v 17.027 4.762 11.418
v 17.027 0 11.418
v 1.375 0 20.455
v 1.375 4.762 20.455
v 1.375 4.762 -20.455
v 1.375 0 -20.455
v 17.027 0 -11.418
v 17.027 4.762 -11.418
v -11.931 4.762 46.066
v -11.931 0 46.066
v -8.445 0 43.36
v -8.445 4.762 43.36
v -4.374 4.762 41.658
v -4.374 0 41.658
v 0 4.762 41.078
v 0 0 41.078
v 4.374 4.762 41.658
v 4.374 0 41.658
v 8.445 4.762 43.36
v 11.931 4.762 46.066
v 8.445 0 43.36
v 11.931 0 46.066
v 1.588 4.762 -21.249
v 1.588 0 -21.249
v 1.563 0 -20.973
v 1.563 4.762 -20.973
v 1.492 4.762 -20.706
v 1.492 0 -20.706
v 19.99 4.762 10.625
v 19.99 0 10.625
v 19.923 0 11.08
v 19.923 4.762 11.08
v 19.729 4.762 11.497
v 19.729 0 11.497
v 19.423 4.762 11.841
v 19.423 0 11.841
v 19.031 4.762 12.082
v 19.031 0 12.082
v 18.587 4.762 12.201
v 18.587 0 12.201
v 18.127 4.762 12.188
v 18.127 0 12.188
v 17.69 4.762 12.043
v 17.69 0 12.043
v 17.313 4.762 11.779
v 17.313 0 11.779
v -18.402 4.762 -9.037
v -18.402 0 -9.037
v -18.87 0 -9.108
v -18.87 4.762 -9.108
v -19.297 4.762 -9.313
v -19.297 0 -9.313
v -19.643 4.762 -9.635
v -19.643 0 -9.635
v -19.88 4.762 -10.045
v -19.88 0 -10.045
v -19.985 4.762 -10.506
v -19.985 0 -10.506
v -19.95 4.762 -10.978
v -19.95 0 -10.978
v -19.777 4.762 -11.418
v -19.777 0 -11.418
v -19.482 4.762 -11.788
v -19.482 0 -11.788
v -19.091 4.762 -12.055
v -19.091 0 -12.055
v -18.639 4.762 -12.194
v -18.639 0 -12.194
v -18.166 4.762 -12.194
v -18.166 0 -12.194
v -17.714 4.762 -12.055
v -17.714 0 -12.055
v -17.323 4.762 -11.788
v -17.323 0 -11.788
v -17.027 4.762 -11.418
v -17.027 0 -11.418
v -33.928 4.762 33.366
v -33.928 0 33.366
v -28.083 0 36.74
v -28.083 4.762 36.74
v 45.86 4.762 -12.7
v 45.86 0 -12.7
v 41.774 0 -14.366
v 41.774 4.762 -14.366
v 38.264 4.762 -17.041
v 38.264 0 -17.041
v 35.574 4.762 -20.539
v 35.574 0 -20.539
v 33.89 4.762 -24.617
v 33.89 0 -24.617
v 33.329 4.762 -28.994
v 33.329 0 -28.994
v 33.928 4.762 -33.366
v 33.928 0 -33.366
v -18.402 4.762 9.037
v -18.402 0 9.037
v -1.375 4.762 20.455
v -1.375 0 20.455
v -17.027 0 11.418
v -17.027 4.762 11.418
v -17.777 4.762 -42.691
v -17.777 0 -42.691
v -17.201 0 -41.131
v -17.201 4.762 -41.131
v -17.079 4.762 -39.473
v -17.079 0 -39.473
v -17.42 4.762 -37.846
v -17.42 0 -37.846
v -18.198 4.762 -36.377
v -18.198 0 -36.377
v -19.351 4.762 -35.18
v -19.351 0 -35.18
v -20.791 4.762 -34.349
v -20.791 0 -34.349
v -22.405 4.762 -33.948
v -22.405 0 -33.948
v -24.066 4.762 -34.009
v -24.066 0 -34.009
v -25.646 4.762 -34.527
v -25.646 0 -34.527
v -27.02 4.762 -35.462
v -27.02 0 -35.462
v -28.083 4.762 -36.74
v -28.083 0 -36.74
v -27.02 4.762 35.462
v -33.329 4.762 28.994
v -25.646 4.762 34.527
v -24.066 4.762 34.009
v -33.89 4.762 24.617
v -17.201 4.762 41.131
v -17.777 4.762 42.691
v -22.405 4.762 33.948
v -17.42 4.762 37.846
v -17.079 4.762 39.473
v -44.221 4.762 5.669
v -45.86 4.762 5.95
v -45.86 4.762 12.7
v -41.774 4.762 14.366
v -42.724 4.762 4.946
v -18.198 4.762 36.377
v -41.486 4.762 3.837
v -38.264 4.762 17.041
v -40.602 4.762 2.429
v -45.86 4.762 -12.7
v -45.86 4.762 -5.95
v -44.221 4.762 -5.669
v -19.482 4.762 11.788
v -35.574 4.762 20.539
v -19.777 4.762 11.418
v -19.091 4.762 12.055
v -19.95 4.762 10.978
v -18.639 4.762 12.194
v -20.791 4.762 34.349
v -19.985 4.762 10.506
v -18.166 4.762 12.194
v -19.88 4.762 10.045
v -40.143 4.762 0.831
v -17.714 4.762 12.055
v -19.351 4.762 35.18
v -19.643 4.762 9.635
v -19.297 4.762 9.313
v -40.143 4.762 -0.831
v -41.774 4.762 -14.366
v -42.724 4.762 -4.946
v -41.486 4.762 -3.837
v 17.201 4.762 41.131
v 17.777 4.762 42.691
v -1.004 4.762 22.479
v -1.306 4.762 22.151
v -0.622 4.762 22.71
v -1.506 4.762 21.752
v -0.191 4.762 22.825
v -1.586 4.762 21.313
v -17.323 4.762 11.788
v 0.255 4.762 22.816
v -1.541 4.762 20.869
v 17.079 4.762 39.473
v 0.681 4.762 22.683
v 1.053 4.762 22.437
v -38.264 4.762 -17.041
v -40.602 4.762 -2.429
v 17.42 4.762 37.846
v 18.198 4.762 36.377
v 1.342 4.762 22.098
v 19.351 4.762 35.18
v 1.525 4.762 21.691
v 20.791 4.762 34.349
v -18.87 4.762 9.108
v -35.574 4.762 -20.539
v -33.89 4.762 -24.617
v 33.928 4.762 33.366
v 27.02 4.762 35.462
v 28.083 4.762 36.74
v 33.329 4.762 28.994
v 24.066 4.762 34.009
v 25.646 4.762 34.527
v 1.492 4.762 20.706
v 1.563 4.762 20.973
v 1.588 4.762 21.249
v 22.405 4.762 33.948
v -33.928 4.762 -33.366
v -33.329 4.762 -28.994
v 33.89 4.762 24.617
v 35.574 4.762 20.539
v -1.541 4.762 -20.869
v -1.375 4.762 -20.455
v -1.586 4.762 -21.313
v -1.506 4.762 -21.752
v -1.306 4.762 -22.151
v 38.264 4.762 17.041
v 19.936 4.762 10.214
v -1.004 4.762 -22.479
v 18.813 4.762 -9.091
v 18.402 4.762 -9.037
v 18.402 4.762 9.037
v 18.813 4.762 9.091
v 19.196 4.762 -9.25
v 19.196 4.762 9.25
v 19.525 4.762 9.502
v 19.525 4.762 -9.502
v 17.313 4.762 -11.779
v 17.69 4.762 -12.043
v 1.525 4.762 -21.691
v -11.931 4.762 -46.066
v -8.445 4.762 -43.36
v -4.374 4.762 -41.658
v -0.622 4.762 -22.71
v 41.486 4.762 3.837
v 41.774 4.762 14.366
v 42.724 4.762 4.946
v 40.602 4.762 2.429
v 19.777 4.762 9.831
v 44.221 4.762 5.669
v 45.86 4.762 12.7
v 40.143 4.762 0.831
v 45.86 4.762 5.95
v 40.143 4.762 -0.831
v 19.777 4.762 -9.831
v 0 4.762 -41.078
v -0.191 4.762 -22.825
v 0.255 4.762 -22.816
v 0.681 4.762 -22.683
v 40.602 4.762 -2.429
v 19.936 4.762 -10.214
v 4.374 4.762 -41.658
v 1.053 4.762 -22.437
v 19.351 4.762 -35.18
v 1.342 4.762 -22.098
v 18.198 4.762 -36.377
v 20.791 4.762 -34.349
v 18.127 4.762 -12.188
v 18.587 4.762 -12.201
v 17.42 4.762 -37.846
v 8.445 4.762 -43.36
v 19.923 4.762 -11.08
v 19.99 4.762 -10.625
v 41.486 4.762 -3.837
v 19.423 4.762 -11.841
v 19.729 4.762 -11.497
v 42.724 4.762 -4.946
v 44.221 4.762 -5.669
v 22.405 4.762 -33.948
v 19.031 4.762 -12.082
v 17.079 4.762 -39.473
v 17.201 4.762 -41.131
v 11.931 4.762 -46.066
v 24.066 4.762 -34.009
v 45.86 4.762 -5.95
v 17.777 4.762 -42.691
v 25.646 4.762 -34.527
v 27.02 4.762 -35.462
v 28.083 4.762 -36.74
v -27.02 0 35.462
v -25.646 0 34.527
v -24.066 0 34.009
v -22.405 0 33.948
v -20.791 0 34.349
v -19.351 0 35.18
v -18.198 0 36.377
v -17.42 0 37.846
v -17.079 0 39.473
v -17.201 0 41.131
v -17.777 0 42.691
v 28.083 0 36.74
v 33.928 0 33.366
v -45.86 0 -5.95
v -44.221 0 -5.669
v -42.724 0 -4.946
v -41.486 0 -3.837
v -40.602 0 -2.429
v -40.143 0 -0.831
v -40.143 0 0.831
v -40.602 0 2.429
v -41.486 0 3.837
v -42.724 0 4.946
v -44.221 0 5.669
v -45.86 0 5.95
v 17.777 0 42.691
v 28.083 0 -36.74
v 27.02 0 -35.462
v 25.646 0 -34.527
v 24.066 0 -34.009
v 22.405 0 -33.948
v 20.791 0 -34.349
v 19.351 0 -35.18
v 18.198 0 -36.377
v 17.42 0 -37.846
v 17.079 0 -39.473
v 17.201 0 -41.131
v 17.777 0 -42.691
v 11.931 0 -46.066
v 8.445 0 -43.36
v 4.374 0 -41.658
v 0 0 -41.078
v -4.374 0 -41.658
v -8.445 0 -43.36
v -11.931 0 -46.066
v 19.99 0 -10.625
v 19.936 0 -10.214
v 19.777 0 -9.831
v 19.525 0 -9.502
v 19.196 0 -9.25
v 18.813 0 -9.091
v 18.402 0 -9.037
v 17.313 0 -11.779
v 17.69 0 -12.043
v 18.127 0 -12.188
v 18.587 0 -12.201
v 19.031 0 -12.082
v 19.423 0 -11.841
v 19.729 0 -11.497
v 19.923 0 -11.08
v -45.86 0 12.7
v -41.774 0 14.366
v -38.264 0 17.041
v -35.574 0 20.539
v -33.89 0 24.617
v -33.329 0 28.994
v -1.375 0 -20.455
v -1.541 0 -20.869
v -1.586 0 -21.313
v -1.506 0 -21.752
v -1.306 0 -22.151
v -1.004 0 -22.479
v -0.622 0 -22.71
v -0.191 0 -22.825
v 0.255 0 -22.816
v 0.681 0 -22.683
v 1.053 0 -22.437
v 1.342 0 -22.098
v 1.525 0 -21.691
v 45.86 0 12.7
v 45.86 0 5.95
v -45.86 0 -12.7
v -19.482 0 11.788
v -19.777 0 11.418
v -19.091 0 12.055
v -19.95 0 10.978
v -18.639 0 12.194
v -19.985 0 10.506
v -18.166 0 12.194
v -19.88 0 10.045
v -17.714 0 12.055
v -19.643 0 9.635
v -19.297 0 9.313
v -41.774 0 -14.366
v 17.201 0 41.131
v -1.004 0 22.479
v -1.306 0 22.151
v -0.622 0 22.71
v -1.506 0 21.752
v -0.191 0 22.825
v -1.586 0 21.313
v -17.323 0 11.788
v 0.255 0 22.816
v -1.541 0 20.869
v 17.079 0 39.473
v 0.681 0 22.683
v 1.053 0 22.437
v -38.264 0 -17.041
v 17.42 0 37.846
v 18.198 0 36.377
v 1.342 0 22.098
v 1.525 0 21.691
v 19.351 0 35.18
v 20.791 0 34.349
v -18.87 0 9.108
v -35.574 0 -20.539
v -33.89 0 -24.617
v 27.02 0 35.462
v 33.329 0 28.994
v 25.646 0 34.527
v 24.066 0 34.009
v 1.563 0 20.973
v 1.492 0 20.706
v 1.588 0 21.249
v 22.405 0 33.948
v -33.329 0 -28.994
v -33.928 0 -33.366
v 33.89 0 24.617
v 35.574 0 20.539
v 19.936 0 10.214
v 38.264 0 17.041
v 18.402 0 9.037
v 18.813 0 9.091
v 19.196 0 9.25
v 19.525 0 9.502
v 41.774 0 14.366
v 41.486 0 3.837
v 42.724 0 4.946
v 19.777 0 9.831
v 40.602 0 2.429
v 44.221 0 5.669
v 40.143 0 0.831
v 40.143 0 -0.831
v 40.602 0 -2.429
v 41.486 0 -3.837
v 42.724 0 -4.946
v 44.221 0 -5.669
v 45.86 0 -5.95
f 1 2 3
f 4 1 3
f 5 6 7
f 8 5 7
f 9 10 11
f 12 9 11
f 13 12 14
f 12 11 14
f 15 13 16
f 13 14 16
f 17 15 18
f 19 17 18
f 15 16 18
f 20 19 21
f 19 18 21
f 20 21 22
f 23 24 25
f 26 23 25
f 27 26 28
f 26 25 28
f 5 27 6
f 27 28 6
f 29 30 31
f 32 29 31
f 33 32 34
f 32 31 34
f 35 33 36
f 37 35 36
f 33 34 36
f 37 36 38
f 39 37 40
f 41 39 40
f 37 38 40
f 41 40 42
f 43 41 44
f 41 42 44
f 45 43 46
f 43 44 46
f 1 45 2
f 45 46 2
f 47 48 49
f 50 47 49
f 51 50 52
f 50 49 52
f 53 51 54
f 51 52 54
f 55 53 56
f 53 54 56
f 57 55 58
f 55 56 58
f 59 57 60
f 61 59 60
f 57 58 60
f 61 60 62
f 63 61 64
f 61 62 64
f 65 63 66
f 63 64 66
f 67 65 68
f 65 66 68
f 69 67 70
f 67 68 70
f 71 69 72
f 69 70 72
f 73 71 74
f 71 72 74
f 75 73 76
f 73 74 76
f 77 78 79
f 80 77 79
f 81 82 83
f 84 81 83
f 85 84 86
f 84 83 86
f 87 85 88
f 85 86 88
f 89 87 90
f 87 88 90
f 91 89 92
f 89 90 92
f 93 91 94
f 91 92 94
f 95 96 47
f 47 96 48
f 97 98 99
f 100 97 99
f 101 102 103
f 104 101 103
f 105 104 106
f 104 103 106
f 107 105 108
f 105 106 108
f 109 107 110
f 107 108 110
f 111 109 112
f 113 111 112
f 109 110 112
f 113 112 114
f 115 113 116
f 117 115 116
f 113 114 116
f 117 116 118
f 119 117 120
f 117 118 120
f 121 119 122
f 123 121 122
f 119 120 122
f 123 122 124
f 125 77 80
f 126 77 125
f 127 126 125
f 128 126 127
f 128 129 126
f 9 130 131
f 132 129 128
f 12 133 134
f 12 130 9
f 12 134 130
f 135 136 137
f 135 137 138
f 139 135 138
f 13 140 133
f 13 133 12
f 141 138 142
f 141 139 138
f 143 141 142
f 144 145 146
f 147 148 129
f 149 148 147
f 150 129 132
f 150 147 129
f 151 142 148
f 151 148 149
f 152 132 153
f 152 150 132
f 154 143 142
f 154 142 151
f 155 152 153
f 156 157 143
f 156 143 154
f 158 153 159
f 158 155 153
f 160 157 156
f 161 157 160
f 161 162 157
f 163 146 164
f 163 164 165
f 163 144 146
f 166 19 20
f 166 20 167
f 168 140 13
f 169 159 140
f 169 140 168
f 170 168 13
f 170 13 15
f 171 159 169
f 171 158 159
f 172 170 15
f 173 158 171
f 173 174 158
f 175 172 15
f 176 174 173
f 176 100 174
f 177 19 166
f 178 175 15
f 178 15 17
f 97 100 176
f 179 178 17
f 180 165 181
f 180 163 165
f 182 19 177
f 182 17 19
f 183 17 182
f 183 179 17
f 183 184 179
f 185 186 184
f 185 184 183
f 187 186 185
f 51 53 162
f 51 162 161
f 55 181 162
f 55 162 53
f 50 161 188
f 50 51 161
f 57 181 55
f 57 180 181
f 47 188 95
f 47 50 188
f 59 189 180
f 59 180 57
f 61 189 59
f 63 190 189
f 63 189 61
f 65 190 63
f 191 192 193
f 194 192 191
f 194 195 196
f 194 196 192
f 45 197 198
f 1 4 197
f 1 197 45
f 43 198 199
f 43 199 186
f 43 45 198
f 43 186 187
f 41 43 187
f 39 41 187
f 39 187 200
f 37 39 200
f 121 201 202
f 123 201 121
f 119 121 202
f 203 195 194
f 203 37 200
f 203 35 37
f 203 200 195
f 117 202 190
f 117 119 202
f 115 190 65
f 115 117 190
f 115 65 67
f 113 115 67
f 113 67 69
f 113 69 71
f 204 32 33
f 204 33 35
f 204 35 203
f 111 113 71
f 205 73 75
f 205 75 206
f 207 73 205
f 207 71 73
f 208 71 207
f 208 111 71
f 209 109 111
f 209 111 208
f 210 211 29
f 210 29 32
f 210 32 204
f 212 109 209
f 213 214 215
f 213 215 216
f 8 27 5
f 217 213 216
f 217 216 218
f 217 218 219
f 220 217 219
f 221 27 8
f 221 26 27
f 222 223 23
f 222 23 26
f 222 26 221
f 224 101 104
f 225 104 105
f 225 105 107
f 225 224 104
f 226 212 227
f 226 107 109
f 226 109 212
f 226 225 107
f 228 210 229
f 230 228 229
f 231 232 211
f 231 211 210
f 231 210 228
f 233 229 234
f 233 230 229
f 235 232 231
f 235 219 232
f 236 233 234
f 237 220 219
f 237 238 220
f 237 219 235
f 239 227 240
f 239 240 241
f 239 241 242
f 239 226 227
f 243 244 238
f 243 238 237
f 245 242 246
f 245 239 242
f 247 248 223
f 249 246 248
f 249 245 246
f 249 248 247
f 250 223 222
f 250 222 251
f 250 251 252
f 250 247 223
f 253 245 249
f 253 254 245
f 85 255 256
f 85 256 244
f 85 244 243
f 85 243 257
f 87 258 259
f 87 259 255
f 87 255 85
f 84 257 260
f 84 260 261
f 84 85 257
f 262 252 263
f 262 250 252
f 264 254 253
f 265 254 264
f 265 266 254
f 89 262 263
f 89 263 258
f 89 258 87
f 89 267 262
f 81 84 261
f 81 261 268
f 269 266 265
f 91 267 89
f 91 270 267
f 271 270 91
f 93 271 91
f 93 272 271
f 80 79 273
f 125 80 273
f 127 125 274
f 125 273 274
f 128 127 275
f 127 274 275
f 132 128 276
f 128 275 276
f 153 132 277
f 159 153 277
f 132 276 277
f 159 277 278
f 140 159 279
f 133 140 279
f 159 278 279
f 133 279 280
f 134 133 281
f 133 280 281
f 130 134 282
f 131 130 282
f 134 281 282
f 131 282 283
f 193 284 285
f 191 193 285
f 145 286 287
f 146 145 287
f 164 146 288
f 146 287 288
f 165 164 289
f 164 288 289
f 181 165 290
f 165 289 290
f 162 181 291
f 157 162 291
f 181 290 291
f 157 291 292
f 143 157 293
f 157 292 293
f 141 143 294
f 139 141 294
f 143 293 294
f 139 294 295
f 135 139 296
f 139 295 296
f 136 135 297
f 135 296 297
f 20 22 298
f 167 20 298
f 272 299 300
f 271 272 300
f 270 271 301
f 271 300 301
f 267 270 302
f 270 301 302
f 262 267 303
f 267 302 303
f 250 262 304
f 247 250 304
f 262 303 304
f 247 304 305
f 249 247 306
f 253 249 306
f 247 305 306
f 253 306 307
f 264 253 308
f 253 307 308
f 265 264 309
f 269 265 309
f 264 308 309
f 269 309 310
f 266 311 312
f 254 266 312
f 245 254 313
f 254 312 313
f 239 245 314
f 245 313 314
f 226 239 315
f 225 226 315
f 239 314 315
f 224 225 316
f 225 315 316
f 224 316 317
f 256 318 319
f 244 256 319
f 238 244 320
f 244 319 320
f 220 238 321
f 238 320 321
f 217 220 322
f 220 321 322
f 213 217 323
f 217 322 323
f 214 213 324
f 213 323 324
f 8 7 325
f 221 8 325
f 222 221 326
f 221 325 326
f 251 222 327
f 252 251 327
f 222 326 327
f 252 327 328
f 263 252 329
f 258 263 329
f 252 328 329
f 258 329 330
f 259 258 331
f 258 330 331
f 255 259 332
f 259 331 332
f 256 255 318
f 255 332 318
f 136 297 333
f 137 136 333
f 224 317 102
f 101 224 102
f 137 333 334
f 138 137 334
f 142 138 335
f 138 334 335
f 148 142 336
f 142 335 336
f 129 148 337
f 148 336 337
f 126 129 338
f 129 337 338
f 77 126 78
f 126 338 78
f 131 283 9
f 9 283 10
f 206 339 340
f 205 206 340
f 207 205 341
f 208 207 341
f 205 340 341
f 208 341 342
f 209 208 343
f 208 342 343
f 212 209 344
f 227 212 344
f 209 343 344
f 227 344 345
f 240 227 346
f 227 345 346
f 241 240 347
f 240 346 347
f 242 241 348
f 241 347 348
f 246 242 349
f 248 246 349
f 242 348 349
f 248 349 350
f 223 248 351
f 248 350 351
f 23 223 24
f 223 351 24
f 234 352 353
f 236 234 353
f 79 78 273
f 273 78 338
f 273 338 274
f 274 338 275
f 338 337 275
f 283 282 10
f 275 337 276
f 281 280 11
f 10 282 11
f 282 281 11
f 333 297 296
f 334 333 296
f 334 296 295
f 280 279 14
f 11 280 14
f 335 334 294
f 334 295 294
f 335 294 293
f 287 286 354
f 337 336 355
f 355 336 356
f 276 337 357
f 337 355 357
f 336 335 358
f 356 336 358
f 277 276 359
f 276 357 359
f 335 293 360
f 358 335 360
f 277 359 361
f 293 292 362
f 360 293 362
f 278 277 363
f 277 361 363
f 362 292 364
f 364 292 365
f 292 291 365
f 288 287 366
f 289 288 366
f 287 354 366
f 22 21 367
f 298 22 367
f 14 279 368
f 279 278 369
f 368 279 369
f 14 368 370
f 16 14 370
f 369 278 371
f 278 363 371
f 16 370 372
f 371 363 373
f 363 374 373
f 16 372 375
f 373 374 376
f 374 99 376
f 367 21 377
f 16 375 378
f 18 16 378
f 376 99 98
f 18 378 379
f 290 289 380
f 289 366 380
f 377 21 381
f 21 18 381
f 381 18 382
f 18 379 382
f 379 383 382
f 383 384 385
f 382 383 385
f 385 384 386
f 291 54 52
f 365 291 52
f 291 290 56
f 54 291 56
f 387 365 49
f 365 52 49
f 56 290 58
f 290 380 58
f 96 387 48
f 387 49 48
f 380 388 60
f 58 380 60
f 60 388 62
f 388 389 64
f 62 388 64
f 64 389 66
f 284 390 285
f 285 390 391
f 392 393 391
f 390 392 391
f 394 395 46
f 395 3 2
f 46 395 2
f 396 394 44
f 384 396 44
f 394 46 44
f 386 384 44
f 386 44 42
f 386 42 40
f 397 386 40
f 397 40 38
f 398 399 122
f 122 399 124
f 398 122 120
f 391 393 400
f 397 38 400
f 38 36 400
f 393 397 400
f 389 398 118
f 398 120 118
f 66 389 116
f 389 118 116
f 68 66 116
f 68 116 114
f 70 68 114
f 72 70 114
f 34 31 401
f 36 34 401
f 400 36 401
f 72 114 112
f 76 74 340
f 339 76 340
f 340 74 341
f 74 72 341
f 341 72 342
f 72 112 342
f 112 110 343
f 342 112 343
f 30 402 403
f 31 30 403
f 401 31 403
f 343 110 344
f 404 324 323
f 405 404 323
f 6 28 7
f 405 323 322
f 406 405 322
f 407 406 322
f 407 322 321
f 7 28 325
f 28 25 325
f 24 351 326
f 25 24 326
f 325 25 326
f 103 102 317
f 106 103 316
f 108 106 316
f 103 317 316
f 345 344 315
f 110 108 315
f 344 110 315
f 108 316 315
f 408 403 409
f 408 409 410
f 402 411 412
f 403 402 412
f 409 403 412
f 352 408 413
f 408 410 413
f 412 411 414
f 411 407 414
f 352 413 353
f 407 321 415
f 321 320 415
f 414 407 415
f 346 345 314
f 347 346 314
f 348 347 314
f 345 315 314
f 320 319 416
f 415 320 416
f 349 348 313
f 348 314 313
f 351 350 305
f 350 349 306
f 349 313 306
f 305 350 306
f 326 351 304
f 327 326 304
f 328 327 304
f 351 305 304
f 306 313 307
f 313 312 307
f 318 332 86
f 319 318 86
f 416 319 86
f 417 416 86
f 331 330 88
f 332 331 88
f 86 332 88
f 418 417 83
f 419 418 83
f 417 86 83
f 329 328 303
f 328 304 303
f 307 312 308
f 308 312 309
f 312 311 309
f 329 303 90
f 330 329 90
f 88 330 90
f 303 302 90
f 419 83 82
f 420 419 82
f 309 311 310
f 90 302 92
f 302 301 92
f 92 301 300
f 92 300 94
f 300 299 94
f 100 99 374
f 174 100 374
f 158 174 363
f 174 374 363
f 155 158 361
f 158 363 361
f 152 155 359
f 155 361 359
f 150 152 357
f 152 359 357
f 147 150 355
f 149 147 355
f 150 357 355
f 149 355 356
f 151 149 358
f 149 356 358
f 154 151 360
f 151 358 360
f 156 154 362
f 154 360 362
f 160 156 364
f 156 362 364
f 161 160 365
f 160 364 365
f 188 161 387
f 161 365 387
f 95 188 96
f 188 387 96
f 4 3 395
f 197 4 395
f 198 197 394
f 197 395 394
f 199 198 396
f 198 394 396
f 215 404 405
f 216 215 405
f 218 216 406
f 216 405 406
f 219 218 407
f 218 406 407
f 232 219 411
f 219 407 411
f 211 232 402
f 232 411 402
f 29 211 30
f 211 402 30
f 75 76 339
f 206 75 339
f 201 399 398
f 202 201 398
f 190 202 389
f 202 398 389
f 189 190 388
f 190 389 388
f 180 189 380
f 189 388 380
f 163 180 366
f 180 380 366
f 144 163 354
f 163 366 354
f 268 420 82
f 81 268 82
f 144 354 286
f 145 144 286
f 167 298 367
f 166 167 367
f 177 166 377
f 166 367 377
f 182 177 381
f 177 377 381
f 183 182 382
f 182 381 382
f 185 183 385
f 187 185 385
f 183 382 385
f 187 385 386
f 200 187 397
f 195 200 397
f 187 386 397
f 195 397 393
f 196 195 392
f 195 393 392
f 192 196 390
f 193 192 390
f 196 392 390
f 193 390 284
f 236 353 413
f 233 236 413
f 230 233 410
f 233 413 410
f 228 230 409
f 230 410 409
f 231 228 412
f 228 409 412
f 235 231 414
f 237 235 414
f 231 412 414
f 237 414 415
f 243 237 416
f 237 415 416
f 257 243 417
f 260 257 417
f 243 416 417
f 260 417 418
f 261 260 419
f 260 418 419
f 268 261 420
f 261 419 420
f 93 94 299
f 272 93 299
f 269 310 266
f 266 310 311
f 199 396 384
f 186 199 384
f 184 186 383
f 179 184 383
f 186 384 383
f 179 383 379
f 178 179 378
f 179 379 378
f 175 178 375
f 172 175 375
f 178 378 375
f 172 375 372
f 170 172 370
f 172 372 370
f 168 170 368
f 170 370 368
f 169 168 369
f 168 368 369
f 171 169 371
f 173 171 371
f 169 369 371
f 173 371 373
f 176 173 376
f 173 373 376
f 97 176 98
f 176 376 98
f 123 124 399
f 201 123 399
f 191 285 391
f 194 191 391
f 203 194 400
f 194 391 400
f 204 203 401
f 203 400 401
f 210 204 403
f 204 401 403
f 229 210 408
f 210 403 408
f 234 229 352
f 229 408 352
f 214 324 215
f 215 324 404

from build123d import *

# Parameters (mm, degrees)
BOSS_EXTRUDE1_DEPTH = 4.7625


with BuildPart() as part:
    # Sketch1 → Boss-Extrude1 (new body)
    with BuildSketch(Plane(origin=(0, 0, 0), x_dir=(1, 0, 0), z_dir=(0, 1, 0))):
        with BuildLine():
            ThreePointArc((-33.928372628, 33.36566521), (-35.574336427, 20.538852712), (-45.8597, 12.7))
            Line((-45.8597, 12.7), (-45.8597, 5.950469261))
            ThreePointArc((-45.8597, 5.950469261), (-40.084375, 0), (-45.8597, -5.950469261))
            Line((-45.8597, -5.950469261), (-45.8597, -12.7))
            ThreePointArc((-45.8597, -12.7), (-35.574336427, -20.538852712), (-33.928372628, -33.36566521))
            Line((-33.928372628, -33.36566521), (-28.083107544, -36.740430579))
            ThreePointArc((-28.083107544, -36.740430579), (-20.0421875, -34.714087045), (-17.776592456, -42.69089984))
            Line((-17.776592456, -42.69089984), (-11.931327372, -46.06566521))
            ThreePointArc((-11.931327372, -46.06566521), (0, -41.077705425), (11.931327372, -46.06566521))
            Line((11.931327372, -46.06566521), (17.776592456, -42.69089984))
            ThreePointArc((17.776592456, -42.69089984), (20.0421875, -34.714087045), (28.083107544, -36.740430579))
            Line((28.083107544, -36.740430579), (33.928372628, -33.36566521))
            ThreePointArc((33.928372628, -33.36566521), (35.574336427, -20.538852712), (45.8597, -12.7))
            Line((45.8597, -12.7), (45.8597, -5.950469261))
            ThreePointArc((45.8597, -5.950469261), (40.084375, 0), (45.8597, 5.950469261))
            Line((45.8597, 5.950469261), (45.8597, 12.7))
            ThreePointArc((45.8597, 12.7), (35.574336427, 20.538852712), (33.928372628, 33.36566521))
            Line((33.928372628, 33.36566521), (28.083107544, 36.740430579))
            ThreePointArc((28.083107544, 36.740430579), (20.0421875, 34.714087045), (17.776592456, 42.69089984))
            Line((17.776592456, 42.69089984), (11.931327372, 46.06566521))
            ThreePointArc((11.931327372, 46.06566521), (0, 41.077705425), (-11.931327372, 46.06566521))
            Line((-11.931327372, 46.06566521), (-17.776592456, 42.69089984))
            ThreePointArc((-17.776592456, 42.69089984), (-20.0421875, 34.714087045), (-28.083107544, 36.740430579))
            Line((-28.083107544, 36.740430579), (-33.928372628, 33.36566521))
        make_face()
        with BuildLine():
            Line((1.374815329, 20.455395717), (17.027484671, 11.418322859))
            ThreePointArc((17.027484671, 11.418322859), (18.813175234, 12.157980108), (19.9898, 10.624572859))
            ThreePointArc((19.9898, 10.624572859), (19.524832015, 9.502040844), (18.4023, 9.037072859))
            Line((18.4023, 9.037072859), (18.4023, -9.037072859))
            ThreePointArc((18.4023, -9.037072859), (19.524832015, -9.502040844), (19.9898, -10.624572859))
            ThreePointArc((19.9898, -10.624572859), (18.813175234, -12.157980108), (17.027484671, -11.418322859))
            Line((17.027484671, -11.418322859), (1.374815329, -20.455395717))
            ThreePointArc((1.374815329, -20.455395717), (1.533407249, -20.838270483), (1.5875, -21.249145717))
            ThreePointArc((1.5875, -21.249145717), (-0.410875234, -22.782552967), (-1.374815329, -20.455395717))
            Line((-1.374815329, -20.455395717), (-17.027484671, -11.418322859))
            ThreePointArc((-17.027484671, -11.418322859), (-19.777115329, -11.418322859), (-18.4023, -9.037072859))
            Line((-18.4023, -9.037072859), (-18.4023, 9.037072859))
            ThreePointArc((-18.4023, 9.037072859), (-19.777115329, 11.418322859), (-17.027484671, 11.418322859))
            Line((-17.027484671, 11.418322859), (-1.374815329, 20.455395717))
            ThreePointArc((-1.374815329, 20.455395717), (-0.410875234, 22.782552967), (1.5875, 21.249145717))
            ThreePointArc((1.5875, 21.249145717), (1.533407249, 20.838270483), (1.374815329, 20.455395717))
        make_face(mode=Mode.SUBTRACT)
    extrude(amount=BOSS_EXTRUDE1_DEPTH)


solid = part.part
